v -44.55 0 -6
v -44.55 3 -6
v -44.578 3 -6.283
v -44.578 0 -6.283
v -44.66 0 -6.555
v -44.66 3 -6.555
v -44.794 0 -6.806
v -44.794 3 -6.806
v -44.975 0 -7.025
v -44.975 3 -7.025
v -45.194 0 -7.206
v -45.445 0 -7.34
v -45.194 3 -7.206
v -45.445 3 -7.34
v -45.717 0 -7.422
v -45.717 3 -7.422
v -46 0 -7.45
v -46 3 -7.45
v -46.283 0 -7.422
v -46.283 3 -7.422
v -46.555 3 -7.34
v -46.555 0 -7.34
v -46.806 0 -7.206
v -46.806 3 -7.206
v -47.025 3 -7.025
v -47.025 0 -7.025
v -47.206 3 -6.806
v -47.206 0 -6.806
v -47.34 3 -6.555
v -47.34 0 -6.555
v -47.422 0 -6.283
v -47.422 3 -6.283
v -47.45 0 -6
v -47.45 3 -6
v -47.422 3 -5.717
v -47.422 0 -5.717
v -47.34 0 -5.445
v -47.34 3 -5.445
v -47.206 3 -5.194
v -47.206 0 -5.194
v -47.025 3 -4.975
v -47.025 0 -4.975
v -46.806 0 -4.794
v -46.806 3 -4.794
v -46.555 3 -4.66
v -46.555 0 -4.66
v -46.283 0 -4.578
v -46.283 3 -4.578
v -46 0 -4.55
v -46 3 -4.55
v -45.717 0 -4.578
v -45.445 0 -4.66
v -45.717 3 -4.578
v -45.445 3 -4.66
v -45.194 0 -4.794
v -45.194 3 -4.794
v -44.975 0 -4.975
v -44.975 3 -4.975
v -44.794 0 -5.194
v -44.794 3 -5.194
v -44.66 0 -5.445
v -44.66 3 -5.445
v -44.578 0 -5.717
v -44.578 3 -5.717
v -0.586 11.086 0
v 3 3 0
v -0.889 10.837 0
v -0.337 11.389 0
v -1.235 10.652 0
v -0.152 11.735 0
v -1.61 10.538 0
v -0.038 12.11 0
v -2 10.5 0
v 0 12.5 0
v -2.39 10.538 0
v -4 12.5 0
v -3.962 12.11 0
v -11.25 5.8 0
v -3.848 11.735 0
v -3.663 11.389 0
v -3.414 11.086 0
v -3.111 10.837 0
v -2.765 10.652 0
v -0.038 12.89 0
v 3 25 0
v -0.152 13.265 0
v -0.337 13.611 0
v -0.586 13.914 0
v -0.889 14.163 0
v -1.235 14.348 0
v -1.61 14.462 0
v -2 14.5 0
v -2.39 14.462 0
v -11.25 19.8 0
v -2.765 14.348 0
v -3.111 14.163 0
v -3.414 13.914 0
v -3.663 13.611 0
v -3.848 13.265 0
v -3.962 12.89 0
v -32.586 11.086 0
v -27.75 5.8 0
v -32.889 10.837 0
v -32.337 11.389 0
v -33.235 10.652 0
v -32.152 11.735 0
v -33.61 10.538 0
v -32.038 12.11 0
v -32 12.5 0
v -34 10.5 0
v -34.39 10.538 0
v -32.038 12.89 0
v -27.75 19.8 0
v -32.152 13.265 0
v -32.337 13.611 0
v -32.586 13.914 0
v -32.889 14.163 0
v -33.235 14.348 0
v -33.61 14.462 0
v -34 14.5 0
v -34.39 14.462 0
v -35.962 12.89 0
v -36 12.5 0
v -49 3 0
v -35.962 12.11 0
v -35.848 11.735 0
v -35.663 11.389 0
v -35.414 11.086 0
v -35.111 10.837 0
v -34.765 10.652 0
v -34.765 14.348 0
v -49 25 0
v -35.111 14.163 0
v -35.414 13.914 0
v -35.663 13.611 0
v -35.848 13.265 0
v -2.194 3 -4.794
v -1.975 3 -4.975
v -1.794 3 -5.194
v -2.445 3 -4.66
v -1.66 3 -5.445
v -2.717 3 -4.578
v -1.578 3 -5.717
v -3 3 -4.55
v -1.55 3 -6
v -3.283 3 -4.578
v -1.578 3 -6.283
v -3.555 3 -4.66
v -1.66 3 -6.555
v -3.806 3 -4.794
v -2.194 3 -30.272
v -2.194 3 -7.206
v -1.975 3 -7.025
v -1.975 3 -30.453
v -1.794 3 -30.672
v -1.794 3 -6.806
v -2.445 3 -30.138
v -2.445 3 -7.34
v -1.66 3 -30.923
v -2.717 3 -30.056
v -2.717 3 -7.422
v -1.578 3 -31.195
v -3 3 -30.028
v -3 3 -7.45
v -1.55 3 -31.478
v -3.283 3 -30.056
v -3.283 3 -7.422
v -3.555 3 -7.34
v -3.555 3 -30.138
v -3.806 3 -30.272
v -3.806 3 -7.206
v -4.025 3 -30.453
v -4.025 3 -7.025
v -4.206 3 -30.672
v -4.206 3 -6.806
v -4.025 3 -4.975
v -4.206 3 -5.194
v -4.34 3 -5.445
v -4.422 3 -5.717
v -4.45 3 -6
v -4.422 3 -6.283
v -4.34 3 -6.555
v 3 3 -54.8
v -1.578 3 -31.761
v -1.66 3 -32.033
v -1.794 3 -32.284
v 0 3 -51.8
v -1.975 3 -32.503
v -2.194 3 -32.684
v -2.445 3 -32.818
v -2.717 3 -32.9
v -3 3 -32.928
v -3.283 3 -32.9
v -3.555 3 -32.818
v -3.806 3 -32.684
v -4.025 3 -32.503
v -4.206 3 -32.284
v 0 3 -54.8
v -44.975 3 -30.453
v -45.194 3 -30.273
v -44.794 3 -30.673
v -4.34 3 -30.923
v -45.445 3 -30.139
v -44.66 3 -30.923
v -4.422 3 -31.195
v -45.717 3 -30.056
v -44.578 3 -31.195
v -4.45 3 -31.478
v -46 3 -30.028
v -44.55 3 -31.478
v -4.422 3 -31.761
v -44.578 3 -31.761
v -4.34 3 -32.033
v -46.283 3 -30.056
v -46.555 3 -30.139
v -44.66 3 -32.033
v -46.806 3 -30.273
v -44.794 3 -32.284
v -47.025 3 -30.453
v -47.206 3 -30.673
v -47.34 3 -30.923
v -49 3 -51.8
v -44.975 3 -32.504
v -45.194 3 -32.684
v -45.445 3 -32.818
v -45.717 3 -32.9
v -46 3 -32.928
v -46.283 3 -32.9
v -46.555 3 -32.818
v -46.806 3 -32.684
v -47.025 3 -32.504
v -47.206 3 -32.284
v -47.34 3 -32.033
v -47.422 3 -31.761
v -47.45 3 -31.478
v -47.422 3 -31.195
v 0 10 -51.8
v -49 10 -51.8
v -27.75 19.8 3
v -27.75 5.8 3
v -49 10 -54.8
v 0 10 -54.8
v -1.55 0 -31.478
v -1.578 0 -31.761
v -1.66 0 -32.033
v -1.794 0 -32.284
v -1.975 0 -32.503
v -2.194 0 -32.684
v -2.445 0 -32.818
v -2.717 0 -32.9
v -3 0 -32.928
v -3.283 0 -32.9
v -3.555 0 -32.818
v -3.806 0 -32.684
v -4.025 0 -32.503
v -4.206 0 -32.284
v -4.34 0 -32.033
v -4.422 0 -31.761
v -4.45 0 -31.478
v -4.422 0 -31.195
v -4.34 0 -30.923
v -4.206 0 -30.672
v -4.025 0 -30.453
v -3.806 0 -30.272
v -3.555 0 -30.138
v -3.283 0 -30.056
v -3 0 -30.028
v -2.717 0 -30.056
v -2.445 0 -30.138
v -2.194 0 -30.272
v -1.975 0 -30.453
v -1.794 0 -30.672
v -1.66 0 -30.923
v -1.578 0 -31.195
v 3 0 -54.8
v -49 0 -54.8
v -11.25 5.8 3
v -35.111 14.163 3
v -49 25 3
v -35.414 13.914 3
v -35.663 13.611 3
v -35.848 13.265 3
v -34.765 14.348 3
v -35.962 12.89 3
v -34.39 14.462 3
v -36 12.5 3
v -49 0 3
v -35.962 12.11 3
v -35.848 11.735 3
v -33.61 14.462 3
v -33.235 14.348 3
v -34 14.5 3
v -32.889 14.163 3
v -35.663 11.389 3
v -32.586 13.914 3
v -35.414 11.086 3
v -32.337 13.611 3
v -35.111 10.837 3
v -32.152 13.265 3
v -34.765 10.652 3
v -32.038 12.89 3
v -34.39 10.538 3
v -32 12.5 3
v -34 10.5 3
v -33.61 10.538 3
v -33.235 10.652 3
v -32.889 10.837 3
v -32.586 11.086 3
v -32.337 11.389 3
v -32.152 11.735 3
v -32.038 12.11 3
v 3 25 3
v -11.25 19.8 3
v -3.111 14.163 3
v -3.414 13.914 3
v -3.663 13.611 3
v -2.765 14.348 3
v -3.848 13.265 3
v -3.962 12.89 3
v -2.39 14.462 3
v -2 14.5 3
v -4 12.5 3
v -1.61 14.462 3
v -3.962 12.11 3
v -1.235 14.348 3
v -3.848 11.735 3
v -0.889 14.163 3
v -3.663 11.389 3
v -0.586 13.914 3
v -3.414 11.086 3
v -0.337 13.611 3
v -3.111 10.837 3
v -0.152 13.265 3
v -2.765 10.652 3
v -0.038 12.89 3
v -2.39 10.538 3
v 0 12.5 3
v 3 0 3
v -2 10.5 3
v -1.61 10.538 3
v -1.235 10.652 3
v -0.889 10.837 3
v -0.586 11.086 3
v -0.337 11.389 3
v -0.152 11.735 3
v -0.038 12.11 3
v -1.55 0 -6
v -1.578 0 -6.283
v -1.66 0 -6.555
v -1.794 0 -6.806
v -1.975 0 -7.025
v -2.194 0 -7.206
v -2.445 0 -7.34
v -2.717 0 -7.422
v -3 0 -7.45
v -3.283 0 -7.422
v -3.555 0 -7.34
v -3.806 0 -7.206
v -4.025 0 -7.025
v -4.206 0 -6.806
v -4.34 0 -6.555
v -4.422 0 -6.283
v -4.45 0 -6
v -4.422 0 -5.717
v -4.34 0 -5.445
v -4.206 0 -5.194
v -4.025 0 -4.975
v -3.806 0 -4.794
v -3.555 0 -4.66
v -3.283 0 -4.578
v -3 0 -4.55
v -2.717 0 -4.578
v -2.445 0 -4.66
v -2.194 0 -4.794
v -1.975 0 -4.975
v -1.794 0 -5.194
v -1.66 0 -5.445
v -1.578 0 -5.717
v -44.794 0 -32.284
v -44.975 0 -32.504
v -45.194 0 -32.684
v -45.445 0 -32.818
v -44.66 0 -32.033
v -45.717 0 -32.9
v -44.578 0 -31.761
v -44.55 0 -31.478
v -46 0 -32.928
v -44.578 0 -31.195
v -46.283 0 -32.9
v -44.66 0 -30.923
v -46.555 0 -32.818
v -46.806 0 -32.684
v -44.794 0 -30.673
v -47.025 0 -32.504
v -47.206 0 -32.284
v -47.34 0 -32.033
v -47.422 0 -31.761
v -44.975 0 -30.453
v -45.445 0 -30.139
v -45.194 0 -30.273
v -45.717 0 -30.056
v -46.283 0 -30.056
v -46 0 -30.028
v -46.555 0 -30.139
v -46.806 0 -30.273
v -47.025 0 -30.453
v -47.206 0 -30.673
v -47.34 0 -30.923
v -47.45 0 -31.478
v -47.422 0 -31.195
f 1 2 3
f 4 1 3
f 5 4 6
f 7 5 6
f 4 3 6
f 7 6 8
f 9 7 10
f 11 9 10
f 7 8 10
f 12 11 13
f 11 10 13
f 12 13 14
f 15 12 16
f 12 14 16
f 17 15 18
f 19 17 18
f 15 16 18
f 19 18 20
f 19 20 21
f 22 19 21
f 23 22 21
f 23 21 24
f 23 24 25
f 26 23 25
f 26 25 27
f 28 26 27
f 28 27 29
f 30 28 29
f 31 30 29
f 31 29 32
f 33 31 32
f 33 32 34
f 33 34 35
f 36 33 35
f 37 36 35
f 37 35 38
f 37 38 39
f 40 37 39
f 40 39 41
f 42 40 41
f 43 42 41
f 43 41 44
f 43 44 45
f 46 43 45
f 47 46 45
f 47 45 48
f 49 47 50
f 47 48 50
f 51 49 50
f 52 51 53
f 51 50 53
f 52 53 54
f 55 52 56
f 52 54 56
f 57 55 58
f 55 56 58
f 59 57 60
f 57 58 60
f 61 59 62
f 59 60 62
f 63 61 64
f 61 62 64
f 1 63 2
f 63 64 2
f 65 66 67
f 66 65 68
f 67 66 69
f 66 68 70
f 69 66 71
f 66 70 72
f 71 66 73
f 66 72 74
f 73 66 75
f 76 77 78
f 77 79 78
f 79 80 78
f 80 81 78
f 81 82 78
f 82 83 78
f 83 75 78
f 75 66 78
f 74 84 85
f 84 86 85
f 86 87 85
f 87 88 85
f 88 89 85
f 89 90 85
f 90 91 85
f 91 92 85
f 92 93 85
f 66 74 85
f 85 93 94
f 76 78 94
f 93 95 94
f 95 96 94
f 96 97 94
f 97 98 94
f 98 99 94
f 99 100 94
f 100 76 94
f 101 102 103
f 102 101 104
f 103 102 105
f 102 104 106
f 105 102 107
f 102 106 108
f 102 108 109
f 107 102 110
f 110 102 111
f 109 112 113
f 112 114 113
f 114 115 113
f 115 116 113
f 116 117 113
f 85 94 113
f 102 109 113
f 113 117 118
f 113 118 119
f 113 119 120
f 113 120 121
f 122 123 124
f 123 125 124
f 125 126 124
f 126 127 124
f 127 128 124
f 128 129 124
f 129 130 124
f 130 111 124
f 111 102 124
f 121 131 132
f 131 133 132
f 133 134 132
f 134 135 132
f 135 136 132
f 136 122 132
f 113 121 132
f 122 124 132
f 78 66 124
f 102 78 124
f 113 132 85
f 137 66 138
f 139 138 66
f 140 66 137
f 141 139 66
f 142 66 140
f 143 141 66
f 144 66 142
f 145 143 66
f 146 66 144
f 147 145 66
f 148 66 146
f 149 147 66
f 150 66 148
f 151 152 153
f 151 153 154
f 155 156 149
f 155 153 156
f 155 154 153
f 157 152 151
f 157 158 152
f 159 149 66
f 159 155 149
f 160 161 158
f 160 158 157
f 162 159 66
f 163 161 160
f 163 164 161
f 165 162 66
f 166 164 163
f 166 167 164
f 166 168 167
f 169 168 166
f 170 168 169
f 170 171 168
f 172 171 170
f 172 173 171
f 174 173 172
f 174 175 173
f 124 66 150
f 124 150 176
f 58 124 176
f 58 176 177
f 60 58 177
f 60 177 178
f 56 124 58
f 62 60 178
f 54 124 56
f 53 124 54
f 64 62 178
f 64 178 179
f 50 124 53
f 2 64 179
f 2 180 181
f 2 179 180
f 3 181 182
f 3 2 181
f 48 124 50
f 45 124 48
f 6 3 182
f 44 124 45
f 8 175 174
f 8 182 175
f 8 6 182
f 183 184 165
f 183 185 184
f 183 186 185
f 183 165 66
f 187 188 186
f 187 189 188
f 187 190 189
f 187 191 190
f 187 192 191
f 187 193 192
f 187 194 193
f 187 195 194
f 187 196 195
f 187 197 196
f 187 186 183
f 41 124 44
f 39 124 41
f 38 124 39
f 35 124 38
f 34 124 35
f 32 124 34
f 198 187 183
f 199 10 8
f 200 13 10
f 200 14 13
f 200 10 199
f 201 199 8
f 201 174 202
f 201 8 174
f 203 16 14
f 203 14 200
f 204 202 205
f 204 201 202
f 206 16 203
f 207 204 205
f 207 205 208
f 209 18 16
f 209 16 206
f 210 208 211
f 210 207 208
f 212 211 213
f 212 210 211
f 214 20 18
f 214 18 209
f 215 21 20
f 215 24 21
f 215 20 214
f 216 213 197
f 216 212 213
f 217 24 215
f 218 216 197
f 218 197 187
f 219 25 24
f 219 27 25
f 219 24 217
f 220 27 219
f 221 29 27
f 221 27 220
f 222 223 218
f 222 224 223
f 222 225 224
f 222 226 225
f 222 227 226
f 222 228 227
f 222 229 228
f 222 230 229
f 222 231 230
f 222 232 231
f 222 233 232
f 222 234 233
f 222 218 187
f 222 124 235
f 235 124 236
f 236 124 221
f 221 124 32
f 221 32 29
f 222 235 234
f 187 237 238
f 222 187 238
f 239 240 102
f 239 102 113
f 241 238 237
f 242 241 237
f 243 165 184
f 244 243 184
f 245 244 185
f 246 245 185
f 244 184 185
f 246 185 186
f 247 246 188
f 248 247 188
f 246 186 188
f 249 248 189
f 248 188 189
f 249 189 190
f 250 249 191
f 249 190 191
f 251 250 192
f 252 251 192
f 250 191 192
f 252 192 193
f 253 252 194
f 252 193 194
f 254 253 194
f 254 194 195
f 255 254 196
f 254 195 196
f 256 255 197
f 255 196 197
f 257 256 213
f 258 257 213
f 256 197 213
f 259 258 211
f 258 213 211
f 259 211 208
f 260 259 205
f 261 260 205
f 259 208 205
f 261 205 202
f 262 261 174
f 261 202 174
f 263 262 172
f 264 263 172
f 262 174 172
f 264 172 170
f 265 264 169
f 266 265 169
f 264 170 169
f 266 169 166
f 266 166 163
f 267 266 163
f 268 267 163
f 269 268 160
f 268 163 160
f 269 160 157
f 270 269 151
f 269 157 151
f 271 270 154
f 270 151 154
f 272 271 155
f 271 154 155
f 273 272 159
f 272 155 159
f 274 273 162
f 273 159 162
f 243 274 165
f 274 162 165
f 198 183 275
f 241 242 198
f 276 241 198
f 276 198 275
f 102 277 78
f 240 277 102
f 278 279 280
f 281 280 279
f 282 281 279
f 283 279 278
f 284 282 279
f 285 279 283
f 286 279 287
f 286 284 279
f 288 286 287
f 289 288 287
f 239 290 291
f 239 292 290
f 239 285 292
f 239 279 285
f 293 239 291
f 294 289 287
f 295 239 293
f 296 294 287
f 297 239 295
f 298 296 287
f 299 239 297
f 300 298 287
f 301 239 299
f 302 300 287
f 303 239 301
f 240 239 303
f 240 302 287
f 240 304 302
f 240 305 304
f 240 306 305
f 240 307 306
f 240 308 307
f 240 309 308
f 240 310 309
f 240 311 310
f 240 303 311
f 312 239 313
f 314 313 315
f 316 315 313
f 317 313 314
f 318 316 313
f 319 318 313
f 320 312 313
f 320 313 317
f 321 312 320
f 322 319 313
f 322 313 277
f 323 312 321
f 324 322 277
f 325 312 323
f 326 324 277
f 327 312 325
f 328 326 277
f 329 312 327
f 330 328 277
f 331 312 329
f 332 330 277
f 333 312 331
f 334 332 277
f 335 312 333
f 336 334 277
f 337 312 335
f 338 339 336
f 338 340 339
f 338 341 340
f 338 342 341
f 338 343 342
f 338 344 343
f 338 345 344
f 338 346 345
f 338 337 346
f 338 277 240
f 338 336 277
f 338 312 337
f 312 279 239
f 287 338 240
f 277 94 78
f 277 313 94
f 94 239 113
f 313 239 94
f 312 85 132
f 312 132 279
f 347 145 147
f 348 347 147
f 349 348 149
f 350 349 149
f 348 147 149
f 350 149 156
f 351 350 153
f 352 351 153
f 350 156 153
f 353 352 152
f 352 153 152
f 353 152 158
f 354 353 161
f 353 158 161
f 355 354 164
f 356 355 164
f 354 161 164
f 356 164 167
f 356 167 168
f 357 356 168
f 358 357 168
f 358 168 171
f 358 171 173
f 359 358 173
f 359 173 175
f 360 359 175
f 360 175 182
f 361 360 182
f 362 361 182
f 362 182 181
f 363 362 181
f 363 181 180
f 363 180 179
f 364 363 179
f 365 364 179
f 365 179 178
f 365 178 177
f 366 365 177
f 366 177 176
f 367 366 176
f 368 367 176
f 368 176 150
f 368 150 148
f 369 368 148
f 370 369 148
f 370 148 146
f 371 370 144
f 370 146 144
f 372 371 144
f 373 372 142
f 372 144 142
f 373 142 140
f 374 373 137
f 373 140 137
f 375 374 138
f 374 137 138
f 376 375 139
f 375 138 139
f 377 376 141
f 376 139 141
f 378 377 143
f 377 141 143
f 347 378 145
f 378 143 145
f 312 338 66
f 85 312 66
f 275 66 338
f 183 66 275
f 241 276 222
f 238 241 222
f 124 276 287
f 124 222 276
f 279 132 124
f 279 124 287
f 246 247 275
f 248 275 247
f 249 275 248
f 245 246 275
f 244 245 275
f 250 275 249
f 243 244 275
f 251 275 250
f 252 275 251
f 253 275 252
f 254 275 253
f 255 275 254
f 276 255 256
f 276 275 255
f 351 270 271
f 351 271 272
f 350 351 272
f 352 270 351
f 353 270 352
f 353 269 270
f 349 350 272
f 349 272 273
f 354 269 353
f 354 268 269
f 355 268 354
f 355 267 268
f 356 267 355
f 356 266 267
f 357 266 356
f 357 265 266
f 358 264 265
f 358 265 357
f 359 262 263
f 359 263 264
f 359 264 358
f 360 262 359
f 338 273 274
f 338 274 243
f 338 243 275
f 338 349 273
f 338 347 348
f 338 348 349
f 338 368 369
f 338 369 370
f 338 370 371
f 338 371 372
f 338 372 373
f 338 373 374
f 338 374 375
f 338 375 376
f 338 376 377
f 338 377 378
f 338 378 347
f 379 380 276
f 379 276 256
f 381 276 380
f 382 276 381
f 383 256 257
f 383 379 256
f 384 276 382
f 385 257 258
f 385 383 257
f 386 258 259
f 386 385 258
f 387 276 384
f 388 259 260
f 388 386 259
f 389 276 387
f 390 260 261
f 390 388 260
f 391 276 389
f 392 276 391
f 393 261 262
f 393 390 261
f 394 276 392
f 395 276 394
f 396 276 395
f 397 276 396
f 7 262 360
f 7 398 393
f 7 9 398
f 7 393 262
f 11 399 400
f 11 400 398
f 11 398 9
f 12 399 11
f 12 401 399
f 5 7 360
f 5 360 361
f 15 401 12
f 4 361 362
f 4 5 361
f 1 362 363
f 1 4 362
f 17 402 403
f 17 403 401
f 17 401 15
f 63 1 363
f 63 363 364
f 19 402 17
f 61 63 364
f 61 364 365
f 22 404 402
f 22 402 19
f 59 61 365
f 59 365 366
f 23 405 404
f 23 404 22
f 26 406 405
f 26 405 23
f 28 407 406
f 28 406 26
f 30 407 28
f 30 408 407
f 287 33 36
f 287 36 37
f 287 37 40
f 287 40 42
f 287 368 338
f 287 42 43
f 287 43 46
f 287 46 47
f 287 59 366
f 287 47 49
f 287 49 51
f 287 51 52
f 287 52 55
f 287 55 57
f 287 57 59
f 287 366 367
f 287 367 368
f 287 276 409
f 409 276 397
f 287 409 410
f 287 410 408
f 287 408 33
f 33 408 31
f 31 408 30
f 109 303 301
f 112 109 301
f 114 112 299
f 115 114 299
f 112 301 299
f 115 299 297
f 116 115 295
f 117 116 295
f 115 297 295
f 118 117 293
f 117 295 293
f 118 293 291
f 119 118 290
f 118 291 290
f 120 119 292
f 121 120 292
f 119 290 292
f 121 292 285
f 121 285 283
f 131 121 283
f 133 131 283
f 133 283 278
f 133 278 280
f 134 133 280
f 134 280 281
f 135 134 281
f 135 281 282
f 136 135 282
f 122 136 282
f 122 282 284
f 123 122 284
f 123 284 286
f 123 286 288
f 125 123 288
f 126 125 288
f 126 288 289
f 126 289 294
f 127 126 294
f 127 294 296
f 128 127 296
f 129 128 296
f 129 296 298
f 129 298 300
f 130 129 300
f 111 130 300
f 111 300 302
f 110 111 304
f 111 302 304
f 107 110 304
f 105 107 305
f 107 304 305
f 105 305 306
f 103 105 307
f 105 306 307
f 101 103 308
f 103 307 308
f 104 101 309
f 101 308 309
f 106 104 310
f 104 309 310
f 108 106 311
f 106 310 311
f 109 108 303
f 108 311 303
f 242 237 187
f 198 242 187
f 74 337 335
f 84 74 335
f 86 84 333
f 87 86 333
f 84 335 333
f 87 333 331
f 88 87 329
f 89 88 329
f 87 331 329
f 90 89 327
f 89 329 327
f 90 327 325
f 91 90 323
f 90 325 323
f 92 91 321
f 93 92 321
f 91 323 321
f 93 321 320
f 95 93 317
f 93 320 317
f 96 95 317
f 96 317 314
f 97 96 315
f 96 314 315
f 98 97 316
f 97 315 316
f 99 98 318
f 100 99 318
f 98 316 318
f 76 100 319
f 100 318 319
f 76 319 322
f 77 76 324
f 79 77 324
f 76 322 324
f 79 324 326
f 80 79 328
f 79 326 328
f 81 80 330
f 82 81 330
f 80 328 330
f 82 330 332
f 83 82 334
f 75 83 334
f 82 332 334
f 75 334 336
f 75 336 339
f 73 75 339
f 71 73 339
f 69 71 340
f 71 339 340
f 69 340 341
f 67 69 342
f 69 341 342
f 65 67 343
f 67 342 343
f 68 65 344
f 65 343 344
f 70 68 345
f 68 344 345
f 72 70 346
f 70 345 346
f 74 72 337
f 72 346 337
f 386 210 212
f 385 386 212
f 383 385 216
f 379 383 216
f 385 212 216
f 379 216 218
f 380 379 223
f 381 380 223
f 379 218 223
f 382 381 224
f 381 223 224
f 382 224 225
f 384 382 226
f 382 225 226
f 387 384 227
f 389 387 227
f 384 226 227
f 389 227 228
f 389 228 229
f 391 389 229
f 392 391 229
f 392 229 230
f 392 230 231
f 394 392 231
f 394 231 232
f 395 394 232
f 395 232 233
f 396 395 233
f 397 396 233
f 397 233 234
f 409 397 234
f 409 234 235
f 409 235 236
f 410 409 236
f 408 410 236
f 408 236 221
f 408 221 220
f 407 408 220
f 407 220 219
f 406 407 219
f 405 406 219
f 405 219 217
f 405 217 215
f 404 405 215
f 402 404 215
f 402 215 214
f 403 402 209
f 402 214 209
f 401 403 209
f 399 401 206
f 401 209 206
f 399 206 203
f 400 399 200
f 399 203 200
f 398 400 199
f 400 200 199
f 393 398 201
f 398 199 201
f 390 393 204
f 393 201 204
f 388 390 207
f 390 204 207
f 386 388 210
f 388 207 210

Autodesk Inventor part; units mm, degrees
ref_plane "YZ Plane" through (0, 0, 0) normal (1, 0, 0) x (0, 1, 0)
ref_plane "XZ Plane" through (0, 0, 0) normal (0, 1, 0) x (-1, 0, 0)
ref_plane "XY Plane" through (0, 0, 0) normal (0, 0, 1) x (1, 0, 0)
sketch "Sketch1" plane through (0, 0, 0) normal (0, 1, 0) x (-1, 0, 0)
  line L0 (0, 0) -> (39, 0)
  line L1 (39, 0) -> (39, -51.8)
  line L2 (39, -51.8) -> (0, -51.8)
  line L3 (0, -51.8) -> (0, 0)
  dimension "d0" = 39
  dimension "d1" = 51.8
extrude "Extrusion1" add sketch "Sketch1" along normal blind 3
sketch "Sketch2" plane through (-39, 0, 0) normal (0, 0, 1) x (1, 0, 0)
  line L0 (0, 0) -> (30, 0)
  line L1 (30, 0) -> (30, 25)
  line L2 (30, 25) -> (0, 25)
  line L3 (0, 25) -> (0, 0)
  point P0 (39, 0)
  dimension "d4" = 25
extrude "Extrusion2" add sketch "Sketch2" along normal blind 3
sketch "Sketch3" plane through (-39, 0, 3) normal (0, 0, 1) x (1, 0, 0)
  line L0 (11.25, 19.8) -> (27.75, 19.8)
  line L1 (27.75, 19.8) -> (27.75, 5.8)
  line L2 (27.75, 5.8) -> (11.25, 5.8)
  line L3 (11.25, 5.8) -> (11.25, 19.8)
  line L4 (0, 0) -> (39, 0) projected
  line L5 (30, 0) -> (30, 25) projected
  dimension "d7" = 16.5
  dimension "d8" = 14
  dimension "d9" = 5.8
  dimension "d10" = 2.25
extrude "Extrusion3" cut sketch "Sketch3" against normal blind 3
sketch "Sketch5" plane through (-9, 3, 0) normal (1, 0, 0) x (0, 0, -1)
  line L0 (-3, -3) -> (-3, 22) projected
  line L1 (0, 0) -> (0, 22) projected
  line L2 (-3, -3) -> (0, -3)
  line L3 (0, -3) -> (0, 22)
  line L4 (0, 22) -> (-3, 22)
  line L5 (-3, 22) -> (-3, -3)
  point P0 (0, -3)
extrude "Extrusion4" add sketch "Sketch5" along normal blind 12
sketch "Sketch6" plane through (-39, 0, 3) normal (0, 0, 1) x (1, 0, 0)
  circle A0 centre (5, 12.5) radius 2
  circle A1 centre (37, 12.5) radius 2
  line L0 (0, 25) -> (0, 0) projected
  line L1 (42, 25) -> (42, 0) projected
  line L2 (0, 25) -> (42, 25) projected
  point P0 (39, 0)
  dimension "d15" = 4
  dimension "d16" = 4
  dimension "d17" = 5
  dimension "d18" = 5
  dimension "d19" = 12.5
  dimension "d20" = 12.5
extrude "Extrusion5" cut sketch "Sketch6" against normal blind 9
sketch "Sketch7" plane through (-39, 0, -51.8) normal (-1, 0, 0) x (0, 0, 1)
  line L0 (0, 0) -> (0, 3) projected
  line L1 (0, 3) -> (51.8, 3)
  line L2 (51.8, 3) -> (51.8, 0)
  line L3 (51.8, 0) -> (0, 0)
  line L4 (0, 0) -> (0, 3)
extrude "Extrusion6" add sketch "Sketch7" along normal blind 10
sketch "Sketch8" plane through (0, 3, 0) normal (0, 1, 0) x (1, 0, 0)
  circle A0 centre (-3, 31.478) radius 1.45
  circle A1 centre (-3, 6) radius 1.45
  circle A2 centre (-46, 31.4782) radius 1.45
  circle A3 centre (-46, 6) radius 1.45
  line L0 (0, 0) -> (0, 51.8) projected
  line L1 (-49, 0) -> (-49, 51.8) projected
  line L2 (-39, 0) -> (0, 0) projected
  line L3 (-39, 0) -> (-49, 0) projected
  dimension "d25" = 2.9
  dimension "d26" = 2.9
  dimension "d27" = 2.9
  dimension "d28" = 2.9
  dimension "d29" = 3
  dimension "d30" = 3
  dimension "d31" = 3
  dimension "d32" = 3
  dimension "d38" = 6
  dimension "d39" = 25.4782
  dimension "d40" = 25.478
  dimension "d41" = 6
extrude "Extrusion7" cut sketch "Sketch8" against normal blind 10
sketch "Sketch10" plane through (0, 0, -51.8) normal (0, 0, -1) x (-1, 0, 0)
  line L0 (-3, 25) -> (-3, 0) projected
  line L1 (0, 0) -> (49, 0)
  line L2 (49, 0) -> (49, 10)
  line L3 (49, 10) -> (0, 10)
  line L4 (0, 10) -> (0, 0)
  dimension "d35" = 10
extrude "Extrusion8" add sketch "Sketch10" along normal blind 3
sketch "Sketch11" plane through (-39, 0, 3) normal (-1, 0, 0) x (0, 0, 1)
  line L0 (0, 0) -> (-3, 0) projected
  line L1 (0, 0) -> (-3, 0)
  line L2 (-3, 0) -> (-3, 25)
  line L3 (-3, 25) -> (0, 25)
  line L4 (0, 25) -> (0, 0)
extrude "Extrusion9" add sketch "Sketch11" along normal blind 10
sketch "Sketch12" plane through (0, 0, 0) normal (1, 0, 0) x (0, 0, -1)
  line L0 (0, 3) -> (51.8, 3) projected
  line L1 (54.8, 0) -> (0, 0)
  line L2 (0, 0) -> (0, 3)
  line L3 (0, 3) -> (54.8, 3)
  line L4 (54.8, 3) -> (54.8, 0)
  point P0 (0, 0)
extrude "Extrusion10" add sketch "Sketch12" along normal blind 3
properties part number "SoporteEthernet"
